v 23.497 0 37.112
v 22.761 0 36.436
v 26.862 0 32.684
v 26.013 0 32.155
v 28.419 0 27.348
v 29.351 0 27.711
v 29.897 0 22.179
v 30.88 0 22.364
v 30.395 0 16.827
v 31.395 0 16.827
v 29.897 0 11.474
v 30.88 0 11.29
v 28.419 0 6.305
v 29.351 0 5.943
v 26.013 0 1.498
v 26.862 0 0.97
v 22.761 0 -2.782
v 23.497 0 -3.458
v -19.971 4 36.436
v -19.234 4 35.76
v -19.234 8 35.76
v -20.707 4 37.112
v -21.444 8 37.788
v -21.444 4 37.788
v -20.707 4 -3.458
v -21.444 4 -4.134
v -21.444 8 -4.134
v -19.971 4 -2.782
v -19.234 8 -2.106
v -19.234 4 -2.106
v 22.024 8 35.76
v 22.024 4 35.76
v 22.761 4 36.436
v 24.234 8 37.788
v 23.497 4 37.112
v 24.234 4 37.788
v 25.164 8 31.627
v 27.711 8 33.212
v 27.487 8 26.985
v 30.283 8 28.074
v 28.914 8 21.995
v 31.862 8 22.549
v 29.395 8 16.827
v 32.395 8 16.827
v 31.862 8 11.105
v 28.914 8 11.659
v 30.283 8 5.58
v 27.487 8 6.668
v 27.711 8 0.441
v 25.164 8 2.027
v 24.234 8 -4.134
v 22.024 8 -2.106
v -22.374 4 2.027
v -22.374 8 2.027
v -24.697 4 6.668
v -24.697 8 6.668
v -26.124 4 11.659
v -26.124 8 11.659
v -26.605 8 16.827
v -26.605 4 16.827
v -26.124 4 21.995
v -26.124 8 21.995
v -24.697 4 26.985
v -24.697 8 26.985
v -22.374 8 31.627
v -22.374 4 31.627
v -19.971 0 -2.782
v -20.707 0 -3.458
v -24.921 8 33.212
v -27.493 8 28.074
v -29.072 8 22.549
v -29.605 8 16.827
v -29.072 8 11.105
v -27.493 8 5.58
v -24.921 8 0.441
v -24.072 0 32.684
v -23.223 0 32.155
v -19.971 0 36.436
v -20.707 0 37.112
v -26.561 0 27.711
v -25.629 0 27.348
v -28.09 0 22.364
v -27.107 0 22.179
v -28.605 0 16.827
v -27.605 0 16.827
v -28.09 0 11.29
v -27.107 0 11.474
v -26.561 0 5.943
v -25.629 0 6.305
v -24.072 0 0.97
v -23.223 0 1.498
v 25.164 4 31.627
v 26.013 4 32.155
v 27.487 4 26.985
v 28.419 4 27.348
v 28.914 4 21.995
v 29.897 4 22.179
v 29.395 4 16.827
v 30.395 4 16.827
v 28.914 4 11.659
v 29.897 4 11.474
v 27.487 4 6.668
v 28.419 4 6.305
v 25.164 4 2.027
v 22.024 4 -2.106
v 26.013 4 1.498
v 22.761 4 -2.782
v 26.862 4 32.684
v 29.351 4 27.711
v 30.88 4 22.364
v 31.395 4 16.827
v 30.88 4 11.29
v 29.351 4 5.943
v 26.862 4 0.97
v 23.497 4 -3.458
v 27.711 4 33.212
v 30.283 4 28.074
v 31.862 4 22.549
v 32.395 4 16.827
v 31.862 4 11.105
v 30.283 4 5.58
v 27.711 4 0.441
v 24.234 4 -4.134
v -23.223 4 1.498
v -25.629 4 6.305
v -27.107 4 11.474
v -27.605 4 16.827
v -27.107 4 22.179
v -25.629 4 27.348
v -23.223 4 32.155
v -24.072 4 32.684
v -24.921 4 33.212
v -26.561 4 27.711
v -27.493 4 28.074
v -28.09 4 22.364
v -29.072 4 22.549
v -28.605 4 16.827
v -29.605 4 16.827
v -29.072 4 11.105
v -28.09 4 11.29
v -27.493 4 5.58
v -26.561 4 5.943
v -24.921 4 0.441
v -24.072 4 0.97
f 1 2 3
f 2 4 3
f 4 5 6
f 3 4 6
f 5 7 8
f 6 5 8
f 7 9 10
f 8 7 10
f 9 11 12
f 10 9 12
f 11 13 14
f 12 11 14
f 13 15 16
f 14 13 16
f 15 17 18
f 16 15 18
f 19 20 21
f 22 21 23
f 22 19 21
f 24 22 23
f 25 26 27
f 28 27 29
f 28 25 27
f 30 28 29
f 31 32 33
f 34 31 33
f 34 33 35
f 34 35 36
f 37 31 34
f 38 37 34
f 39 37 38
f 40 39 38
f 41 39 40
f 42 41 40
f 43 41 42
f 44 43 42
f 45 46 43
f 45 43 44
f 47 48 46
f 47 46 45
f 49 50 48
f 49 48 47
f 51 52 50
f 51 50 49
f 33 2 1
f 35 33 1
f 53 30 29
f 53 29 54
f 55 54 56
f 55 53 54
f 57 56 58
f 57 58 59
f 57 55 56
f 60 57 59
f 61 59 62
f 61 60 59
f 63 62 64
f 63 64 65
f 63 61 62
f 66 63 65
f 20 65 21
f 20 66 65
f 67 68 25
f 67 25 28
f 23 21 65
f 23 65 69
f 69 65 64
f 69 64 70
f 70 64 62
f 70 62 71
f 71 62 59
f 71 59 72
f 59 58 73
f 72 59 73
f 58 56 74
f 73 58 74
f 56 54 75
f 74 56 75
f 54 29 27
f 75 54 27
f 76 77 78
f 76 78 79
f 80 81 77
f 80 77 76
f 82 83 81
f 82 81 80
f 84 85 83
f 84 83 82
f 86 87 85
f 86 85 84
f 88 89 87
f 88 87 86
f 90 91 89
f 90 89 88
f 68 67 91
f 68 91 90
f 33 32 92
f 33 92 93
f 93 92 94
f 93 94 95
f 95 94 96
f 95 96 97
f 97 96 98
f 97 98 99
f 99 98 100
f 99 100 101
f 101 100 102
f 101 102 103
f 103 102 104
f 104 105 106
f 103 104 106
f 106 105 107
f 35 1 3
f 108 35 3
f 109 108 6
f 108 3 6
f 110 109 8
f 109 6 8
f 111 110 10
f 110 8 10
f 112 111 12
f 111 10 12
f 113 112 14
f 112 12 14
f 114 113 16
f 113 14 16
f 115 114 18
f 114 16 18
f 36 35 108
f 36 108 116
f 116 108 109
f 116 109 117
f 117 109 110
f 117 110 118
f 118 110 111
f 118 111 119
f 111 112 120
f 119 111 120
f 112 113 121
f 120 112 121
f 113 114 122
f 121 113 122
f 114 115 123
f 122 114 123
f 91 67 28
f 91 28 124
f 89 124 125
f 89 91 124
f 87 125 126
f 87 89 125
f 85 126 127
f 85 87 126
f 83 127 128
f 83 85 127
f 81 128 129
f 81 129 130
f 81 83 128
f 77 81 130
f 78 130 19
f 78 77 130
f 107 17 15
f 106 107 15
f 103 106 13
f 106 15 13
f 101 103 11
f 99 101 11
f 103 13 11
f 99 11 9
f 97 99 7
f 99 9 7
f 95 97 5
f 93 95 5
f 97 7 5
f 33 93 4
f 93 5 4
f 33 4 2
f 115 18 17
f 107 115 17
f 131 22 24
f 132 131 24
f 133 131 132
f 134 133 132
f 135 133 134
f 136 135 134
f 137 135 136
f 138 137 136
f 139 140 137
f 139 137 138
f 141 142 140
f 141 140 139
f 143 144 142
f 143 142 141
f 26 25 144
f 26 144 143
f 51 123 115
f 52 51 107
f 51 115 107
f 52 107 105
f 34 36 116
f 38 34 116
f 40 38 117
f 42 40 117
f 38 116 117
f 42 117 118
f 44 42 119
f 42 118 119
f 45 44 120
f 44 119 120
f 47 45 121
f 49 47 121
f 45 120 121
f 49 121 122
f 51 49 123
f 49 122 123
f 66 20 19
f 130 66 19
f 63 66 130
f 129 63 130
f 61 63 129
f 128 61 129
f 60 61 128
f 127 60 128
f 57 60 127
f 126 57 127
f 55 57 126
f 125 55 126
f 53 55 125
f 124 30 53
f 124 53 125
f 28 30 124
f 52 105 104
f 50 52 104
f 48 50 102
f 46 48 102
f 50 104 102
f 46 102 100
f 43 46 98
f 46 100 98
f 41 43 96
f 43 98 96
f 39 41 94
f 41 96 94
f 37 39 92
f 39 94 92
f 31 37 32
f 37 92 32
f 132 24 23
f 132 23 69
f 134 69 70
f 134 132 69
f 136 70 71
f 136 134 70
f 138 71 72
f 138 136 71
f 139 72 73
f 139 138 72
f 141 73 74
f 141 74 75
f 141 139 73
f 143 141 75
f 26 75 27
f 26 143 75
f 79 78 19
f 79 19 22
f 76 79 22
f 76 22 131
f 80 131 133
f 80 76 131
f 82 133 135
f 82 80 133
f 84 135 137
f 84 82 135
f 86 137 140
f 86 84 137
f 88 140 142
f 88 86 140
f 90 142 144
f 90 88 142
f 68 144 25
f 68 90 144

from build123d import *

# Parameters (mm, degrees)
BOSS_EXTRUDE1_DEPTH   = 4
BOSS_EXTRUDE1_2_DEPTH = 4
BOSS_EXTRUDE2_DEPTH   = 4


with BuildPart() as part:
    # Sketch1 → Boss-Extrude1 (new body)
    with BuildSketch(Plane(origin=(0, 0, 0), x_dir=(1, 0, 0), z_dir=(0, 1, 0))):
        with BuildLine():
            Line((-20.707420854, 3.458295902), (-19.970674607, 2.782126569))
            ThreePointArc((-19.970674607, 2.782126569), (-27.605033442, -16.8267841), (-19.970674607, -36.435694769))
            Line((-19.970674607, -36.435694769), (-20.707420854, -37.111864103))
            ThreePointArc((-20.707420854, -37.111864103), (-28.605033442, -16.8267841), (-20.707420854, 3.458295902))
        make_face()
    extrude(amount=BOSS_EXTRUDE1_DEPTH)



with BuildPart() as body_2:
    # Sketch1 → Boss-Extrude1 2 (new body)
    with BuildSketch(Plane(origin=(0, 0, 0), x_dir=(1, 0, 0), z_dir=(0, 1, 0))):
        with BuildLine():
            Line((22.760607722, -36.435694769), (23.497353969, -37.111864103))
            ThreePointArc((23.497353969, -37.111864103), (31.394966558, -16.8267841), (23.497353969, 3.458295902))
            Line((23.497353969, 3.458295902), (22.760607722, 2.782126569))
            ThreePointArc((22.760607722, 2.782126569), (30.394966558, -16.8267841), (22.760607722, -36.435694769))
        make_face()
    extrude(amount=BOSS_EXTRUDE1_2_DEPTH)


with BuildPart() as part_1:
    add(part.part)

    add(body_2.part)  # Boss-Extrude2 merges body 2
    # Sketch2 → Boss-Extrude2 (add)
    with BuildSketch(Plane(origin=(0, 4, 0), x_dir=(1, 0, 0), z_dir=(0, 1, 0))):
        with BuildLine():
            Line((-21.444167101, 4.134465235), (-19.23392836, 2.105957235))
            ThreePointArc((-19.23392836, 2.105957235), (-26.605033442, -16.8267841), (-19.23392836, -35.759525436))
            Line((-19.23392836, -35.759525436), (-21.444167101, -37.788033436))
            ThreePointArc((-21.444167101, -37.788033436), (-29.605033442, -16.8267841), (-21.444167101, 4.134465235))
        make_face()
        with BuildLine():
            Line((22.023861475, -35.759525436), (24.234100216, -37.788033436))
            ThreePointArc((24.234100216, -37.788033436), (32.394966558, -16.8267841), (24.234100216, 4.134465235))
            Line((24.234100216, 4.134465235), (22.023861475, 2.105957235))
            ThreePointArc((22.023861475, 2.105957235), (29.394966558, -16.8267841), (22.023861475, -35.759525436))
        make_face()
    extrude(amount=BOSS_EXTRUDE2_DEPTH)


solid = part_1.part
